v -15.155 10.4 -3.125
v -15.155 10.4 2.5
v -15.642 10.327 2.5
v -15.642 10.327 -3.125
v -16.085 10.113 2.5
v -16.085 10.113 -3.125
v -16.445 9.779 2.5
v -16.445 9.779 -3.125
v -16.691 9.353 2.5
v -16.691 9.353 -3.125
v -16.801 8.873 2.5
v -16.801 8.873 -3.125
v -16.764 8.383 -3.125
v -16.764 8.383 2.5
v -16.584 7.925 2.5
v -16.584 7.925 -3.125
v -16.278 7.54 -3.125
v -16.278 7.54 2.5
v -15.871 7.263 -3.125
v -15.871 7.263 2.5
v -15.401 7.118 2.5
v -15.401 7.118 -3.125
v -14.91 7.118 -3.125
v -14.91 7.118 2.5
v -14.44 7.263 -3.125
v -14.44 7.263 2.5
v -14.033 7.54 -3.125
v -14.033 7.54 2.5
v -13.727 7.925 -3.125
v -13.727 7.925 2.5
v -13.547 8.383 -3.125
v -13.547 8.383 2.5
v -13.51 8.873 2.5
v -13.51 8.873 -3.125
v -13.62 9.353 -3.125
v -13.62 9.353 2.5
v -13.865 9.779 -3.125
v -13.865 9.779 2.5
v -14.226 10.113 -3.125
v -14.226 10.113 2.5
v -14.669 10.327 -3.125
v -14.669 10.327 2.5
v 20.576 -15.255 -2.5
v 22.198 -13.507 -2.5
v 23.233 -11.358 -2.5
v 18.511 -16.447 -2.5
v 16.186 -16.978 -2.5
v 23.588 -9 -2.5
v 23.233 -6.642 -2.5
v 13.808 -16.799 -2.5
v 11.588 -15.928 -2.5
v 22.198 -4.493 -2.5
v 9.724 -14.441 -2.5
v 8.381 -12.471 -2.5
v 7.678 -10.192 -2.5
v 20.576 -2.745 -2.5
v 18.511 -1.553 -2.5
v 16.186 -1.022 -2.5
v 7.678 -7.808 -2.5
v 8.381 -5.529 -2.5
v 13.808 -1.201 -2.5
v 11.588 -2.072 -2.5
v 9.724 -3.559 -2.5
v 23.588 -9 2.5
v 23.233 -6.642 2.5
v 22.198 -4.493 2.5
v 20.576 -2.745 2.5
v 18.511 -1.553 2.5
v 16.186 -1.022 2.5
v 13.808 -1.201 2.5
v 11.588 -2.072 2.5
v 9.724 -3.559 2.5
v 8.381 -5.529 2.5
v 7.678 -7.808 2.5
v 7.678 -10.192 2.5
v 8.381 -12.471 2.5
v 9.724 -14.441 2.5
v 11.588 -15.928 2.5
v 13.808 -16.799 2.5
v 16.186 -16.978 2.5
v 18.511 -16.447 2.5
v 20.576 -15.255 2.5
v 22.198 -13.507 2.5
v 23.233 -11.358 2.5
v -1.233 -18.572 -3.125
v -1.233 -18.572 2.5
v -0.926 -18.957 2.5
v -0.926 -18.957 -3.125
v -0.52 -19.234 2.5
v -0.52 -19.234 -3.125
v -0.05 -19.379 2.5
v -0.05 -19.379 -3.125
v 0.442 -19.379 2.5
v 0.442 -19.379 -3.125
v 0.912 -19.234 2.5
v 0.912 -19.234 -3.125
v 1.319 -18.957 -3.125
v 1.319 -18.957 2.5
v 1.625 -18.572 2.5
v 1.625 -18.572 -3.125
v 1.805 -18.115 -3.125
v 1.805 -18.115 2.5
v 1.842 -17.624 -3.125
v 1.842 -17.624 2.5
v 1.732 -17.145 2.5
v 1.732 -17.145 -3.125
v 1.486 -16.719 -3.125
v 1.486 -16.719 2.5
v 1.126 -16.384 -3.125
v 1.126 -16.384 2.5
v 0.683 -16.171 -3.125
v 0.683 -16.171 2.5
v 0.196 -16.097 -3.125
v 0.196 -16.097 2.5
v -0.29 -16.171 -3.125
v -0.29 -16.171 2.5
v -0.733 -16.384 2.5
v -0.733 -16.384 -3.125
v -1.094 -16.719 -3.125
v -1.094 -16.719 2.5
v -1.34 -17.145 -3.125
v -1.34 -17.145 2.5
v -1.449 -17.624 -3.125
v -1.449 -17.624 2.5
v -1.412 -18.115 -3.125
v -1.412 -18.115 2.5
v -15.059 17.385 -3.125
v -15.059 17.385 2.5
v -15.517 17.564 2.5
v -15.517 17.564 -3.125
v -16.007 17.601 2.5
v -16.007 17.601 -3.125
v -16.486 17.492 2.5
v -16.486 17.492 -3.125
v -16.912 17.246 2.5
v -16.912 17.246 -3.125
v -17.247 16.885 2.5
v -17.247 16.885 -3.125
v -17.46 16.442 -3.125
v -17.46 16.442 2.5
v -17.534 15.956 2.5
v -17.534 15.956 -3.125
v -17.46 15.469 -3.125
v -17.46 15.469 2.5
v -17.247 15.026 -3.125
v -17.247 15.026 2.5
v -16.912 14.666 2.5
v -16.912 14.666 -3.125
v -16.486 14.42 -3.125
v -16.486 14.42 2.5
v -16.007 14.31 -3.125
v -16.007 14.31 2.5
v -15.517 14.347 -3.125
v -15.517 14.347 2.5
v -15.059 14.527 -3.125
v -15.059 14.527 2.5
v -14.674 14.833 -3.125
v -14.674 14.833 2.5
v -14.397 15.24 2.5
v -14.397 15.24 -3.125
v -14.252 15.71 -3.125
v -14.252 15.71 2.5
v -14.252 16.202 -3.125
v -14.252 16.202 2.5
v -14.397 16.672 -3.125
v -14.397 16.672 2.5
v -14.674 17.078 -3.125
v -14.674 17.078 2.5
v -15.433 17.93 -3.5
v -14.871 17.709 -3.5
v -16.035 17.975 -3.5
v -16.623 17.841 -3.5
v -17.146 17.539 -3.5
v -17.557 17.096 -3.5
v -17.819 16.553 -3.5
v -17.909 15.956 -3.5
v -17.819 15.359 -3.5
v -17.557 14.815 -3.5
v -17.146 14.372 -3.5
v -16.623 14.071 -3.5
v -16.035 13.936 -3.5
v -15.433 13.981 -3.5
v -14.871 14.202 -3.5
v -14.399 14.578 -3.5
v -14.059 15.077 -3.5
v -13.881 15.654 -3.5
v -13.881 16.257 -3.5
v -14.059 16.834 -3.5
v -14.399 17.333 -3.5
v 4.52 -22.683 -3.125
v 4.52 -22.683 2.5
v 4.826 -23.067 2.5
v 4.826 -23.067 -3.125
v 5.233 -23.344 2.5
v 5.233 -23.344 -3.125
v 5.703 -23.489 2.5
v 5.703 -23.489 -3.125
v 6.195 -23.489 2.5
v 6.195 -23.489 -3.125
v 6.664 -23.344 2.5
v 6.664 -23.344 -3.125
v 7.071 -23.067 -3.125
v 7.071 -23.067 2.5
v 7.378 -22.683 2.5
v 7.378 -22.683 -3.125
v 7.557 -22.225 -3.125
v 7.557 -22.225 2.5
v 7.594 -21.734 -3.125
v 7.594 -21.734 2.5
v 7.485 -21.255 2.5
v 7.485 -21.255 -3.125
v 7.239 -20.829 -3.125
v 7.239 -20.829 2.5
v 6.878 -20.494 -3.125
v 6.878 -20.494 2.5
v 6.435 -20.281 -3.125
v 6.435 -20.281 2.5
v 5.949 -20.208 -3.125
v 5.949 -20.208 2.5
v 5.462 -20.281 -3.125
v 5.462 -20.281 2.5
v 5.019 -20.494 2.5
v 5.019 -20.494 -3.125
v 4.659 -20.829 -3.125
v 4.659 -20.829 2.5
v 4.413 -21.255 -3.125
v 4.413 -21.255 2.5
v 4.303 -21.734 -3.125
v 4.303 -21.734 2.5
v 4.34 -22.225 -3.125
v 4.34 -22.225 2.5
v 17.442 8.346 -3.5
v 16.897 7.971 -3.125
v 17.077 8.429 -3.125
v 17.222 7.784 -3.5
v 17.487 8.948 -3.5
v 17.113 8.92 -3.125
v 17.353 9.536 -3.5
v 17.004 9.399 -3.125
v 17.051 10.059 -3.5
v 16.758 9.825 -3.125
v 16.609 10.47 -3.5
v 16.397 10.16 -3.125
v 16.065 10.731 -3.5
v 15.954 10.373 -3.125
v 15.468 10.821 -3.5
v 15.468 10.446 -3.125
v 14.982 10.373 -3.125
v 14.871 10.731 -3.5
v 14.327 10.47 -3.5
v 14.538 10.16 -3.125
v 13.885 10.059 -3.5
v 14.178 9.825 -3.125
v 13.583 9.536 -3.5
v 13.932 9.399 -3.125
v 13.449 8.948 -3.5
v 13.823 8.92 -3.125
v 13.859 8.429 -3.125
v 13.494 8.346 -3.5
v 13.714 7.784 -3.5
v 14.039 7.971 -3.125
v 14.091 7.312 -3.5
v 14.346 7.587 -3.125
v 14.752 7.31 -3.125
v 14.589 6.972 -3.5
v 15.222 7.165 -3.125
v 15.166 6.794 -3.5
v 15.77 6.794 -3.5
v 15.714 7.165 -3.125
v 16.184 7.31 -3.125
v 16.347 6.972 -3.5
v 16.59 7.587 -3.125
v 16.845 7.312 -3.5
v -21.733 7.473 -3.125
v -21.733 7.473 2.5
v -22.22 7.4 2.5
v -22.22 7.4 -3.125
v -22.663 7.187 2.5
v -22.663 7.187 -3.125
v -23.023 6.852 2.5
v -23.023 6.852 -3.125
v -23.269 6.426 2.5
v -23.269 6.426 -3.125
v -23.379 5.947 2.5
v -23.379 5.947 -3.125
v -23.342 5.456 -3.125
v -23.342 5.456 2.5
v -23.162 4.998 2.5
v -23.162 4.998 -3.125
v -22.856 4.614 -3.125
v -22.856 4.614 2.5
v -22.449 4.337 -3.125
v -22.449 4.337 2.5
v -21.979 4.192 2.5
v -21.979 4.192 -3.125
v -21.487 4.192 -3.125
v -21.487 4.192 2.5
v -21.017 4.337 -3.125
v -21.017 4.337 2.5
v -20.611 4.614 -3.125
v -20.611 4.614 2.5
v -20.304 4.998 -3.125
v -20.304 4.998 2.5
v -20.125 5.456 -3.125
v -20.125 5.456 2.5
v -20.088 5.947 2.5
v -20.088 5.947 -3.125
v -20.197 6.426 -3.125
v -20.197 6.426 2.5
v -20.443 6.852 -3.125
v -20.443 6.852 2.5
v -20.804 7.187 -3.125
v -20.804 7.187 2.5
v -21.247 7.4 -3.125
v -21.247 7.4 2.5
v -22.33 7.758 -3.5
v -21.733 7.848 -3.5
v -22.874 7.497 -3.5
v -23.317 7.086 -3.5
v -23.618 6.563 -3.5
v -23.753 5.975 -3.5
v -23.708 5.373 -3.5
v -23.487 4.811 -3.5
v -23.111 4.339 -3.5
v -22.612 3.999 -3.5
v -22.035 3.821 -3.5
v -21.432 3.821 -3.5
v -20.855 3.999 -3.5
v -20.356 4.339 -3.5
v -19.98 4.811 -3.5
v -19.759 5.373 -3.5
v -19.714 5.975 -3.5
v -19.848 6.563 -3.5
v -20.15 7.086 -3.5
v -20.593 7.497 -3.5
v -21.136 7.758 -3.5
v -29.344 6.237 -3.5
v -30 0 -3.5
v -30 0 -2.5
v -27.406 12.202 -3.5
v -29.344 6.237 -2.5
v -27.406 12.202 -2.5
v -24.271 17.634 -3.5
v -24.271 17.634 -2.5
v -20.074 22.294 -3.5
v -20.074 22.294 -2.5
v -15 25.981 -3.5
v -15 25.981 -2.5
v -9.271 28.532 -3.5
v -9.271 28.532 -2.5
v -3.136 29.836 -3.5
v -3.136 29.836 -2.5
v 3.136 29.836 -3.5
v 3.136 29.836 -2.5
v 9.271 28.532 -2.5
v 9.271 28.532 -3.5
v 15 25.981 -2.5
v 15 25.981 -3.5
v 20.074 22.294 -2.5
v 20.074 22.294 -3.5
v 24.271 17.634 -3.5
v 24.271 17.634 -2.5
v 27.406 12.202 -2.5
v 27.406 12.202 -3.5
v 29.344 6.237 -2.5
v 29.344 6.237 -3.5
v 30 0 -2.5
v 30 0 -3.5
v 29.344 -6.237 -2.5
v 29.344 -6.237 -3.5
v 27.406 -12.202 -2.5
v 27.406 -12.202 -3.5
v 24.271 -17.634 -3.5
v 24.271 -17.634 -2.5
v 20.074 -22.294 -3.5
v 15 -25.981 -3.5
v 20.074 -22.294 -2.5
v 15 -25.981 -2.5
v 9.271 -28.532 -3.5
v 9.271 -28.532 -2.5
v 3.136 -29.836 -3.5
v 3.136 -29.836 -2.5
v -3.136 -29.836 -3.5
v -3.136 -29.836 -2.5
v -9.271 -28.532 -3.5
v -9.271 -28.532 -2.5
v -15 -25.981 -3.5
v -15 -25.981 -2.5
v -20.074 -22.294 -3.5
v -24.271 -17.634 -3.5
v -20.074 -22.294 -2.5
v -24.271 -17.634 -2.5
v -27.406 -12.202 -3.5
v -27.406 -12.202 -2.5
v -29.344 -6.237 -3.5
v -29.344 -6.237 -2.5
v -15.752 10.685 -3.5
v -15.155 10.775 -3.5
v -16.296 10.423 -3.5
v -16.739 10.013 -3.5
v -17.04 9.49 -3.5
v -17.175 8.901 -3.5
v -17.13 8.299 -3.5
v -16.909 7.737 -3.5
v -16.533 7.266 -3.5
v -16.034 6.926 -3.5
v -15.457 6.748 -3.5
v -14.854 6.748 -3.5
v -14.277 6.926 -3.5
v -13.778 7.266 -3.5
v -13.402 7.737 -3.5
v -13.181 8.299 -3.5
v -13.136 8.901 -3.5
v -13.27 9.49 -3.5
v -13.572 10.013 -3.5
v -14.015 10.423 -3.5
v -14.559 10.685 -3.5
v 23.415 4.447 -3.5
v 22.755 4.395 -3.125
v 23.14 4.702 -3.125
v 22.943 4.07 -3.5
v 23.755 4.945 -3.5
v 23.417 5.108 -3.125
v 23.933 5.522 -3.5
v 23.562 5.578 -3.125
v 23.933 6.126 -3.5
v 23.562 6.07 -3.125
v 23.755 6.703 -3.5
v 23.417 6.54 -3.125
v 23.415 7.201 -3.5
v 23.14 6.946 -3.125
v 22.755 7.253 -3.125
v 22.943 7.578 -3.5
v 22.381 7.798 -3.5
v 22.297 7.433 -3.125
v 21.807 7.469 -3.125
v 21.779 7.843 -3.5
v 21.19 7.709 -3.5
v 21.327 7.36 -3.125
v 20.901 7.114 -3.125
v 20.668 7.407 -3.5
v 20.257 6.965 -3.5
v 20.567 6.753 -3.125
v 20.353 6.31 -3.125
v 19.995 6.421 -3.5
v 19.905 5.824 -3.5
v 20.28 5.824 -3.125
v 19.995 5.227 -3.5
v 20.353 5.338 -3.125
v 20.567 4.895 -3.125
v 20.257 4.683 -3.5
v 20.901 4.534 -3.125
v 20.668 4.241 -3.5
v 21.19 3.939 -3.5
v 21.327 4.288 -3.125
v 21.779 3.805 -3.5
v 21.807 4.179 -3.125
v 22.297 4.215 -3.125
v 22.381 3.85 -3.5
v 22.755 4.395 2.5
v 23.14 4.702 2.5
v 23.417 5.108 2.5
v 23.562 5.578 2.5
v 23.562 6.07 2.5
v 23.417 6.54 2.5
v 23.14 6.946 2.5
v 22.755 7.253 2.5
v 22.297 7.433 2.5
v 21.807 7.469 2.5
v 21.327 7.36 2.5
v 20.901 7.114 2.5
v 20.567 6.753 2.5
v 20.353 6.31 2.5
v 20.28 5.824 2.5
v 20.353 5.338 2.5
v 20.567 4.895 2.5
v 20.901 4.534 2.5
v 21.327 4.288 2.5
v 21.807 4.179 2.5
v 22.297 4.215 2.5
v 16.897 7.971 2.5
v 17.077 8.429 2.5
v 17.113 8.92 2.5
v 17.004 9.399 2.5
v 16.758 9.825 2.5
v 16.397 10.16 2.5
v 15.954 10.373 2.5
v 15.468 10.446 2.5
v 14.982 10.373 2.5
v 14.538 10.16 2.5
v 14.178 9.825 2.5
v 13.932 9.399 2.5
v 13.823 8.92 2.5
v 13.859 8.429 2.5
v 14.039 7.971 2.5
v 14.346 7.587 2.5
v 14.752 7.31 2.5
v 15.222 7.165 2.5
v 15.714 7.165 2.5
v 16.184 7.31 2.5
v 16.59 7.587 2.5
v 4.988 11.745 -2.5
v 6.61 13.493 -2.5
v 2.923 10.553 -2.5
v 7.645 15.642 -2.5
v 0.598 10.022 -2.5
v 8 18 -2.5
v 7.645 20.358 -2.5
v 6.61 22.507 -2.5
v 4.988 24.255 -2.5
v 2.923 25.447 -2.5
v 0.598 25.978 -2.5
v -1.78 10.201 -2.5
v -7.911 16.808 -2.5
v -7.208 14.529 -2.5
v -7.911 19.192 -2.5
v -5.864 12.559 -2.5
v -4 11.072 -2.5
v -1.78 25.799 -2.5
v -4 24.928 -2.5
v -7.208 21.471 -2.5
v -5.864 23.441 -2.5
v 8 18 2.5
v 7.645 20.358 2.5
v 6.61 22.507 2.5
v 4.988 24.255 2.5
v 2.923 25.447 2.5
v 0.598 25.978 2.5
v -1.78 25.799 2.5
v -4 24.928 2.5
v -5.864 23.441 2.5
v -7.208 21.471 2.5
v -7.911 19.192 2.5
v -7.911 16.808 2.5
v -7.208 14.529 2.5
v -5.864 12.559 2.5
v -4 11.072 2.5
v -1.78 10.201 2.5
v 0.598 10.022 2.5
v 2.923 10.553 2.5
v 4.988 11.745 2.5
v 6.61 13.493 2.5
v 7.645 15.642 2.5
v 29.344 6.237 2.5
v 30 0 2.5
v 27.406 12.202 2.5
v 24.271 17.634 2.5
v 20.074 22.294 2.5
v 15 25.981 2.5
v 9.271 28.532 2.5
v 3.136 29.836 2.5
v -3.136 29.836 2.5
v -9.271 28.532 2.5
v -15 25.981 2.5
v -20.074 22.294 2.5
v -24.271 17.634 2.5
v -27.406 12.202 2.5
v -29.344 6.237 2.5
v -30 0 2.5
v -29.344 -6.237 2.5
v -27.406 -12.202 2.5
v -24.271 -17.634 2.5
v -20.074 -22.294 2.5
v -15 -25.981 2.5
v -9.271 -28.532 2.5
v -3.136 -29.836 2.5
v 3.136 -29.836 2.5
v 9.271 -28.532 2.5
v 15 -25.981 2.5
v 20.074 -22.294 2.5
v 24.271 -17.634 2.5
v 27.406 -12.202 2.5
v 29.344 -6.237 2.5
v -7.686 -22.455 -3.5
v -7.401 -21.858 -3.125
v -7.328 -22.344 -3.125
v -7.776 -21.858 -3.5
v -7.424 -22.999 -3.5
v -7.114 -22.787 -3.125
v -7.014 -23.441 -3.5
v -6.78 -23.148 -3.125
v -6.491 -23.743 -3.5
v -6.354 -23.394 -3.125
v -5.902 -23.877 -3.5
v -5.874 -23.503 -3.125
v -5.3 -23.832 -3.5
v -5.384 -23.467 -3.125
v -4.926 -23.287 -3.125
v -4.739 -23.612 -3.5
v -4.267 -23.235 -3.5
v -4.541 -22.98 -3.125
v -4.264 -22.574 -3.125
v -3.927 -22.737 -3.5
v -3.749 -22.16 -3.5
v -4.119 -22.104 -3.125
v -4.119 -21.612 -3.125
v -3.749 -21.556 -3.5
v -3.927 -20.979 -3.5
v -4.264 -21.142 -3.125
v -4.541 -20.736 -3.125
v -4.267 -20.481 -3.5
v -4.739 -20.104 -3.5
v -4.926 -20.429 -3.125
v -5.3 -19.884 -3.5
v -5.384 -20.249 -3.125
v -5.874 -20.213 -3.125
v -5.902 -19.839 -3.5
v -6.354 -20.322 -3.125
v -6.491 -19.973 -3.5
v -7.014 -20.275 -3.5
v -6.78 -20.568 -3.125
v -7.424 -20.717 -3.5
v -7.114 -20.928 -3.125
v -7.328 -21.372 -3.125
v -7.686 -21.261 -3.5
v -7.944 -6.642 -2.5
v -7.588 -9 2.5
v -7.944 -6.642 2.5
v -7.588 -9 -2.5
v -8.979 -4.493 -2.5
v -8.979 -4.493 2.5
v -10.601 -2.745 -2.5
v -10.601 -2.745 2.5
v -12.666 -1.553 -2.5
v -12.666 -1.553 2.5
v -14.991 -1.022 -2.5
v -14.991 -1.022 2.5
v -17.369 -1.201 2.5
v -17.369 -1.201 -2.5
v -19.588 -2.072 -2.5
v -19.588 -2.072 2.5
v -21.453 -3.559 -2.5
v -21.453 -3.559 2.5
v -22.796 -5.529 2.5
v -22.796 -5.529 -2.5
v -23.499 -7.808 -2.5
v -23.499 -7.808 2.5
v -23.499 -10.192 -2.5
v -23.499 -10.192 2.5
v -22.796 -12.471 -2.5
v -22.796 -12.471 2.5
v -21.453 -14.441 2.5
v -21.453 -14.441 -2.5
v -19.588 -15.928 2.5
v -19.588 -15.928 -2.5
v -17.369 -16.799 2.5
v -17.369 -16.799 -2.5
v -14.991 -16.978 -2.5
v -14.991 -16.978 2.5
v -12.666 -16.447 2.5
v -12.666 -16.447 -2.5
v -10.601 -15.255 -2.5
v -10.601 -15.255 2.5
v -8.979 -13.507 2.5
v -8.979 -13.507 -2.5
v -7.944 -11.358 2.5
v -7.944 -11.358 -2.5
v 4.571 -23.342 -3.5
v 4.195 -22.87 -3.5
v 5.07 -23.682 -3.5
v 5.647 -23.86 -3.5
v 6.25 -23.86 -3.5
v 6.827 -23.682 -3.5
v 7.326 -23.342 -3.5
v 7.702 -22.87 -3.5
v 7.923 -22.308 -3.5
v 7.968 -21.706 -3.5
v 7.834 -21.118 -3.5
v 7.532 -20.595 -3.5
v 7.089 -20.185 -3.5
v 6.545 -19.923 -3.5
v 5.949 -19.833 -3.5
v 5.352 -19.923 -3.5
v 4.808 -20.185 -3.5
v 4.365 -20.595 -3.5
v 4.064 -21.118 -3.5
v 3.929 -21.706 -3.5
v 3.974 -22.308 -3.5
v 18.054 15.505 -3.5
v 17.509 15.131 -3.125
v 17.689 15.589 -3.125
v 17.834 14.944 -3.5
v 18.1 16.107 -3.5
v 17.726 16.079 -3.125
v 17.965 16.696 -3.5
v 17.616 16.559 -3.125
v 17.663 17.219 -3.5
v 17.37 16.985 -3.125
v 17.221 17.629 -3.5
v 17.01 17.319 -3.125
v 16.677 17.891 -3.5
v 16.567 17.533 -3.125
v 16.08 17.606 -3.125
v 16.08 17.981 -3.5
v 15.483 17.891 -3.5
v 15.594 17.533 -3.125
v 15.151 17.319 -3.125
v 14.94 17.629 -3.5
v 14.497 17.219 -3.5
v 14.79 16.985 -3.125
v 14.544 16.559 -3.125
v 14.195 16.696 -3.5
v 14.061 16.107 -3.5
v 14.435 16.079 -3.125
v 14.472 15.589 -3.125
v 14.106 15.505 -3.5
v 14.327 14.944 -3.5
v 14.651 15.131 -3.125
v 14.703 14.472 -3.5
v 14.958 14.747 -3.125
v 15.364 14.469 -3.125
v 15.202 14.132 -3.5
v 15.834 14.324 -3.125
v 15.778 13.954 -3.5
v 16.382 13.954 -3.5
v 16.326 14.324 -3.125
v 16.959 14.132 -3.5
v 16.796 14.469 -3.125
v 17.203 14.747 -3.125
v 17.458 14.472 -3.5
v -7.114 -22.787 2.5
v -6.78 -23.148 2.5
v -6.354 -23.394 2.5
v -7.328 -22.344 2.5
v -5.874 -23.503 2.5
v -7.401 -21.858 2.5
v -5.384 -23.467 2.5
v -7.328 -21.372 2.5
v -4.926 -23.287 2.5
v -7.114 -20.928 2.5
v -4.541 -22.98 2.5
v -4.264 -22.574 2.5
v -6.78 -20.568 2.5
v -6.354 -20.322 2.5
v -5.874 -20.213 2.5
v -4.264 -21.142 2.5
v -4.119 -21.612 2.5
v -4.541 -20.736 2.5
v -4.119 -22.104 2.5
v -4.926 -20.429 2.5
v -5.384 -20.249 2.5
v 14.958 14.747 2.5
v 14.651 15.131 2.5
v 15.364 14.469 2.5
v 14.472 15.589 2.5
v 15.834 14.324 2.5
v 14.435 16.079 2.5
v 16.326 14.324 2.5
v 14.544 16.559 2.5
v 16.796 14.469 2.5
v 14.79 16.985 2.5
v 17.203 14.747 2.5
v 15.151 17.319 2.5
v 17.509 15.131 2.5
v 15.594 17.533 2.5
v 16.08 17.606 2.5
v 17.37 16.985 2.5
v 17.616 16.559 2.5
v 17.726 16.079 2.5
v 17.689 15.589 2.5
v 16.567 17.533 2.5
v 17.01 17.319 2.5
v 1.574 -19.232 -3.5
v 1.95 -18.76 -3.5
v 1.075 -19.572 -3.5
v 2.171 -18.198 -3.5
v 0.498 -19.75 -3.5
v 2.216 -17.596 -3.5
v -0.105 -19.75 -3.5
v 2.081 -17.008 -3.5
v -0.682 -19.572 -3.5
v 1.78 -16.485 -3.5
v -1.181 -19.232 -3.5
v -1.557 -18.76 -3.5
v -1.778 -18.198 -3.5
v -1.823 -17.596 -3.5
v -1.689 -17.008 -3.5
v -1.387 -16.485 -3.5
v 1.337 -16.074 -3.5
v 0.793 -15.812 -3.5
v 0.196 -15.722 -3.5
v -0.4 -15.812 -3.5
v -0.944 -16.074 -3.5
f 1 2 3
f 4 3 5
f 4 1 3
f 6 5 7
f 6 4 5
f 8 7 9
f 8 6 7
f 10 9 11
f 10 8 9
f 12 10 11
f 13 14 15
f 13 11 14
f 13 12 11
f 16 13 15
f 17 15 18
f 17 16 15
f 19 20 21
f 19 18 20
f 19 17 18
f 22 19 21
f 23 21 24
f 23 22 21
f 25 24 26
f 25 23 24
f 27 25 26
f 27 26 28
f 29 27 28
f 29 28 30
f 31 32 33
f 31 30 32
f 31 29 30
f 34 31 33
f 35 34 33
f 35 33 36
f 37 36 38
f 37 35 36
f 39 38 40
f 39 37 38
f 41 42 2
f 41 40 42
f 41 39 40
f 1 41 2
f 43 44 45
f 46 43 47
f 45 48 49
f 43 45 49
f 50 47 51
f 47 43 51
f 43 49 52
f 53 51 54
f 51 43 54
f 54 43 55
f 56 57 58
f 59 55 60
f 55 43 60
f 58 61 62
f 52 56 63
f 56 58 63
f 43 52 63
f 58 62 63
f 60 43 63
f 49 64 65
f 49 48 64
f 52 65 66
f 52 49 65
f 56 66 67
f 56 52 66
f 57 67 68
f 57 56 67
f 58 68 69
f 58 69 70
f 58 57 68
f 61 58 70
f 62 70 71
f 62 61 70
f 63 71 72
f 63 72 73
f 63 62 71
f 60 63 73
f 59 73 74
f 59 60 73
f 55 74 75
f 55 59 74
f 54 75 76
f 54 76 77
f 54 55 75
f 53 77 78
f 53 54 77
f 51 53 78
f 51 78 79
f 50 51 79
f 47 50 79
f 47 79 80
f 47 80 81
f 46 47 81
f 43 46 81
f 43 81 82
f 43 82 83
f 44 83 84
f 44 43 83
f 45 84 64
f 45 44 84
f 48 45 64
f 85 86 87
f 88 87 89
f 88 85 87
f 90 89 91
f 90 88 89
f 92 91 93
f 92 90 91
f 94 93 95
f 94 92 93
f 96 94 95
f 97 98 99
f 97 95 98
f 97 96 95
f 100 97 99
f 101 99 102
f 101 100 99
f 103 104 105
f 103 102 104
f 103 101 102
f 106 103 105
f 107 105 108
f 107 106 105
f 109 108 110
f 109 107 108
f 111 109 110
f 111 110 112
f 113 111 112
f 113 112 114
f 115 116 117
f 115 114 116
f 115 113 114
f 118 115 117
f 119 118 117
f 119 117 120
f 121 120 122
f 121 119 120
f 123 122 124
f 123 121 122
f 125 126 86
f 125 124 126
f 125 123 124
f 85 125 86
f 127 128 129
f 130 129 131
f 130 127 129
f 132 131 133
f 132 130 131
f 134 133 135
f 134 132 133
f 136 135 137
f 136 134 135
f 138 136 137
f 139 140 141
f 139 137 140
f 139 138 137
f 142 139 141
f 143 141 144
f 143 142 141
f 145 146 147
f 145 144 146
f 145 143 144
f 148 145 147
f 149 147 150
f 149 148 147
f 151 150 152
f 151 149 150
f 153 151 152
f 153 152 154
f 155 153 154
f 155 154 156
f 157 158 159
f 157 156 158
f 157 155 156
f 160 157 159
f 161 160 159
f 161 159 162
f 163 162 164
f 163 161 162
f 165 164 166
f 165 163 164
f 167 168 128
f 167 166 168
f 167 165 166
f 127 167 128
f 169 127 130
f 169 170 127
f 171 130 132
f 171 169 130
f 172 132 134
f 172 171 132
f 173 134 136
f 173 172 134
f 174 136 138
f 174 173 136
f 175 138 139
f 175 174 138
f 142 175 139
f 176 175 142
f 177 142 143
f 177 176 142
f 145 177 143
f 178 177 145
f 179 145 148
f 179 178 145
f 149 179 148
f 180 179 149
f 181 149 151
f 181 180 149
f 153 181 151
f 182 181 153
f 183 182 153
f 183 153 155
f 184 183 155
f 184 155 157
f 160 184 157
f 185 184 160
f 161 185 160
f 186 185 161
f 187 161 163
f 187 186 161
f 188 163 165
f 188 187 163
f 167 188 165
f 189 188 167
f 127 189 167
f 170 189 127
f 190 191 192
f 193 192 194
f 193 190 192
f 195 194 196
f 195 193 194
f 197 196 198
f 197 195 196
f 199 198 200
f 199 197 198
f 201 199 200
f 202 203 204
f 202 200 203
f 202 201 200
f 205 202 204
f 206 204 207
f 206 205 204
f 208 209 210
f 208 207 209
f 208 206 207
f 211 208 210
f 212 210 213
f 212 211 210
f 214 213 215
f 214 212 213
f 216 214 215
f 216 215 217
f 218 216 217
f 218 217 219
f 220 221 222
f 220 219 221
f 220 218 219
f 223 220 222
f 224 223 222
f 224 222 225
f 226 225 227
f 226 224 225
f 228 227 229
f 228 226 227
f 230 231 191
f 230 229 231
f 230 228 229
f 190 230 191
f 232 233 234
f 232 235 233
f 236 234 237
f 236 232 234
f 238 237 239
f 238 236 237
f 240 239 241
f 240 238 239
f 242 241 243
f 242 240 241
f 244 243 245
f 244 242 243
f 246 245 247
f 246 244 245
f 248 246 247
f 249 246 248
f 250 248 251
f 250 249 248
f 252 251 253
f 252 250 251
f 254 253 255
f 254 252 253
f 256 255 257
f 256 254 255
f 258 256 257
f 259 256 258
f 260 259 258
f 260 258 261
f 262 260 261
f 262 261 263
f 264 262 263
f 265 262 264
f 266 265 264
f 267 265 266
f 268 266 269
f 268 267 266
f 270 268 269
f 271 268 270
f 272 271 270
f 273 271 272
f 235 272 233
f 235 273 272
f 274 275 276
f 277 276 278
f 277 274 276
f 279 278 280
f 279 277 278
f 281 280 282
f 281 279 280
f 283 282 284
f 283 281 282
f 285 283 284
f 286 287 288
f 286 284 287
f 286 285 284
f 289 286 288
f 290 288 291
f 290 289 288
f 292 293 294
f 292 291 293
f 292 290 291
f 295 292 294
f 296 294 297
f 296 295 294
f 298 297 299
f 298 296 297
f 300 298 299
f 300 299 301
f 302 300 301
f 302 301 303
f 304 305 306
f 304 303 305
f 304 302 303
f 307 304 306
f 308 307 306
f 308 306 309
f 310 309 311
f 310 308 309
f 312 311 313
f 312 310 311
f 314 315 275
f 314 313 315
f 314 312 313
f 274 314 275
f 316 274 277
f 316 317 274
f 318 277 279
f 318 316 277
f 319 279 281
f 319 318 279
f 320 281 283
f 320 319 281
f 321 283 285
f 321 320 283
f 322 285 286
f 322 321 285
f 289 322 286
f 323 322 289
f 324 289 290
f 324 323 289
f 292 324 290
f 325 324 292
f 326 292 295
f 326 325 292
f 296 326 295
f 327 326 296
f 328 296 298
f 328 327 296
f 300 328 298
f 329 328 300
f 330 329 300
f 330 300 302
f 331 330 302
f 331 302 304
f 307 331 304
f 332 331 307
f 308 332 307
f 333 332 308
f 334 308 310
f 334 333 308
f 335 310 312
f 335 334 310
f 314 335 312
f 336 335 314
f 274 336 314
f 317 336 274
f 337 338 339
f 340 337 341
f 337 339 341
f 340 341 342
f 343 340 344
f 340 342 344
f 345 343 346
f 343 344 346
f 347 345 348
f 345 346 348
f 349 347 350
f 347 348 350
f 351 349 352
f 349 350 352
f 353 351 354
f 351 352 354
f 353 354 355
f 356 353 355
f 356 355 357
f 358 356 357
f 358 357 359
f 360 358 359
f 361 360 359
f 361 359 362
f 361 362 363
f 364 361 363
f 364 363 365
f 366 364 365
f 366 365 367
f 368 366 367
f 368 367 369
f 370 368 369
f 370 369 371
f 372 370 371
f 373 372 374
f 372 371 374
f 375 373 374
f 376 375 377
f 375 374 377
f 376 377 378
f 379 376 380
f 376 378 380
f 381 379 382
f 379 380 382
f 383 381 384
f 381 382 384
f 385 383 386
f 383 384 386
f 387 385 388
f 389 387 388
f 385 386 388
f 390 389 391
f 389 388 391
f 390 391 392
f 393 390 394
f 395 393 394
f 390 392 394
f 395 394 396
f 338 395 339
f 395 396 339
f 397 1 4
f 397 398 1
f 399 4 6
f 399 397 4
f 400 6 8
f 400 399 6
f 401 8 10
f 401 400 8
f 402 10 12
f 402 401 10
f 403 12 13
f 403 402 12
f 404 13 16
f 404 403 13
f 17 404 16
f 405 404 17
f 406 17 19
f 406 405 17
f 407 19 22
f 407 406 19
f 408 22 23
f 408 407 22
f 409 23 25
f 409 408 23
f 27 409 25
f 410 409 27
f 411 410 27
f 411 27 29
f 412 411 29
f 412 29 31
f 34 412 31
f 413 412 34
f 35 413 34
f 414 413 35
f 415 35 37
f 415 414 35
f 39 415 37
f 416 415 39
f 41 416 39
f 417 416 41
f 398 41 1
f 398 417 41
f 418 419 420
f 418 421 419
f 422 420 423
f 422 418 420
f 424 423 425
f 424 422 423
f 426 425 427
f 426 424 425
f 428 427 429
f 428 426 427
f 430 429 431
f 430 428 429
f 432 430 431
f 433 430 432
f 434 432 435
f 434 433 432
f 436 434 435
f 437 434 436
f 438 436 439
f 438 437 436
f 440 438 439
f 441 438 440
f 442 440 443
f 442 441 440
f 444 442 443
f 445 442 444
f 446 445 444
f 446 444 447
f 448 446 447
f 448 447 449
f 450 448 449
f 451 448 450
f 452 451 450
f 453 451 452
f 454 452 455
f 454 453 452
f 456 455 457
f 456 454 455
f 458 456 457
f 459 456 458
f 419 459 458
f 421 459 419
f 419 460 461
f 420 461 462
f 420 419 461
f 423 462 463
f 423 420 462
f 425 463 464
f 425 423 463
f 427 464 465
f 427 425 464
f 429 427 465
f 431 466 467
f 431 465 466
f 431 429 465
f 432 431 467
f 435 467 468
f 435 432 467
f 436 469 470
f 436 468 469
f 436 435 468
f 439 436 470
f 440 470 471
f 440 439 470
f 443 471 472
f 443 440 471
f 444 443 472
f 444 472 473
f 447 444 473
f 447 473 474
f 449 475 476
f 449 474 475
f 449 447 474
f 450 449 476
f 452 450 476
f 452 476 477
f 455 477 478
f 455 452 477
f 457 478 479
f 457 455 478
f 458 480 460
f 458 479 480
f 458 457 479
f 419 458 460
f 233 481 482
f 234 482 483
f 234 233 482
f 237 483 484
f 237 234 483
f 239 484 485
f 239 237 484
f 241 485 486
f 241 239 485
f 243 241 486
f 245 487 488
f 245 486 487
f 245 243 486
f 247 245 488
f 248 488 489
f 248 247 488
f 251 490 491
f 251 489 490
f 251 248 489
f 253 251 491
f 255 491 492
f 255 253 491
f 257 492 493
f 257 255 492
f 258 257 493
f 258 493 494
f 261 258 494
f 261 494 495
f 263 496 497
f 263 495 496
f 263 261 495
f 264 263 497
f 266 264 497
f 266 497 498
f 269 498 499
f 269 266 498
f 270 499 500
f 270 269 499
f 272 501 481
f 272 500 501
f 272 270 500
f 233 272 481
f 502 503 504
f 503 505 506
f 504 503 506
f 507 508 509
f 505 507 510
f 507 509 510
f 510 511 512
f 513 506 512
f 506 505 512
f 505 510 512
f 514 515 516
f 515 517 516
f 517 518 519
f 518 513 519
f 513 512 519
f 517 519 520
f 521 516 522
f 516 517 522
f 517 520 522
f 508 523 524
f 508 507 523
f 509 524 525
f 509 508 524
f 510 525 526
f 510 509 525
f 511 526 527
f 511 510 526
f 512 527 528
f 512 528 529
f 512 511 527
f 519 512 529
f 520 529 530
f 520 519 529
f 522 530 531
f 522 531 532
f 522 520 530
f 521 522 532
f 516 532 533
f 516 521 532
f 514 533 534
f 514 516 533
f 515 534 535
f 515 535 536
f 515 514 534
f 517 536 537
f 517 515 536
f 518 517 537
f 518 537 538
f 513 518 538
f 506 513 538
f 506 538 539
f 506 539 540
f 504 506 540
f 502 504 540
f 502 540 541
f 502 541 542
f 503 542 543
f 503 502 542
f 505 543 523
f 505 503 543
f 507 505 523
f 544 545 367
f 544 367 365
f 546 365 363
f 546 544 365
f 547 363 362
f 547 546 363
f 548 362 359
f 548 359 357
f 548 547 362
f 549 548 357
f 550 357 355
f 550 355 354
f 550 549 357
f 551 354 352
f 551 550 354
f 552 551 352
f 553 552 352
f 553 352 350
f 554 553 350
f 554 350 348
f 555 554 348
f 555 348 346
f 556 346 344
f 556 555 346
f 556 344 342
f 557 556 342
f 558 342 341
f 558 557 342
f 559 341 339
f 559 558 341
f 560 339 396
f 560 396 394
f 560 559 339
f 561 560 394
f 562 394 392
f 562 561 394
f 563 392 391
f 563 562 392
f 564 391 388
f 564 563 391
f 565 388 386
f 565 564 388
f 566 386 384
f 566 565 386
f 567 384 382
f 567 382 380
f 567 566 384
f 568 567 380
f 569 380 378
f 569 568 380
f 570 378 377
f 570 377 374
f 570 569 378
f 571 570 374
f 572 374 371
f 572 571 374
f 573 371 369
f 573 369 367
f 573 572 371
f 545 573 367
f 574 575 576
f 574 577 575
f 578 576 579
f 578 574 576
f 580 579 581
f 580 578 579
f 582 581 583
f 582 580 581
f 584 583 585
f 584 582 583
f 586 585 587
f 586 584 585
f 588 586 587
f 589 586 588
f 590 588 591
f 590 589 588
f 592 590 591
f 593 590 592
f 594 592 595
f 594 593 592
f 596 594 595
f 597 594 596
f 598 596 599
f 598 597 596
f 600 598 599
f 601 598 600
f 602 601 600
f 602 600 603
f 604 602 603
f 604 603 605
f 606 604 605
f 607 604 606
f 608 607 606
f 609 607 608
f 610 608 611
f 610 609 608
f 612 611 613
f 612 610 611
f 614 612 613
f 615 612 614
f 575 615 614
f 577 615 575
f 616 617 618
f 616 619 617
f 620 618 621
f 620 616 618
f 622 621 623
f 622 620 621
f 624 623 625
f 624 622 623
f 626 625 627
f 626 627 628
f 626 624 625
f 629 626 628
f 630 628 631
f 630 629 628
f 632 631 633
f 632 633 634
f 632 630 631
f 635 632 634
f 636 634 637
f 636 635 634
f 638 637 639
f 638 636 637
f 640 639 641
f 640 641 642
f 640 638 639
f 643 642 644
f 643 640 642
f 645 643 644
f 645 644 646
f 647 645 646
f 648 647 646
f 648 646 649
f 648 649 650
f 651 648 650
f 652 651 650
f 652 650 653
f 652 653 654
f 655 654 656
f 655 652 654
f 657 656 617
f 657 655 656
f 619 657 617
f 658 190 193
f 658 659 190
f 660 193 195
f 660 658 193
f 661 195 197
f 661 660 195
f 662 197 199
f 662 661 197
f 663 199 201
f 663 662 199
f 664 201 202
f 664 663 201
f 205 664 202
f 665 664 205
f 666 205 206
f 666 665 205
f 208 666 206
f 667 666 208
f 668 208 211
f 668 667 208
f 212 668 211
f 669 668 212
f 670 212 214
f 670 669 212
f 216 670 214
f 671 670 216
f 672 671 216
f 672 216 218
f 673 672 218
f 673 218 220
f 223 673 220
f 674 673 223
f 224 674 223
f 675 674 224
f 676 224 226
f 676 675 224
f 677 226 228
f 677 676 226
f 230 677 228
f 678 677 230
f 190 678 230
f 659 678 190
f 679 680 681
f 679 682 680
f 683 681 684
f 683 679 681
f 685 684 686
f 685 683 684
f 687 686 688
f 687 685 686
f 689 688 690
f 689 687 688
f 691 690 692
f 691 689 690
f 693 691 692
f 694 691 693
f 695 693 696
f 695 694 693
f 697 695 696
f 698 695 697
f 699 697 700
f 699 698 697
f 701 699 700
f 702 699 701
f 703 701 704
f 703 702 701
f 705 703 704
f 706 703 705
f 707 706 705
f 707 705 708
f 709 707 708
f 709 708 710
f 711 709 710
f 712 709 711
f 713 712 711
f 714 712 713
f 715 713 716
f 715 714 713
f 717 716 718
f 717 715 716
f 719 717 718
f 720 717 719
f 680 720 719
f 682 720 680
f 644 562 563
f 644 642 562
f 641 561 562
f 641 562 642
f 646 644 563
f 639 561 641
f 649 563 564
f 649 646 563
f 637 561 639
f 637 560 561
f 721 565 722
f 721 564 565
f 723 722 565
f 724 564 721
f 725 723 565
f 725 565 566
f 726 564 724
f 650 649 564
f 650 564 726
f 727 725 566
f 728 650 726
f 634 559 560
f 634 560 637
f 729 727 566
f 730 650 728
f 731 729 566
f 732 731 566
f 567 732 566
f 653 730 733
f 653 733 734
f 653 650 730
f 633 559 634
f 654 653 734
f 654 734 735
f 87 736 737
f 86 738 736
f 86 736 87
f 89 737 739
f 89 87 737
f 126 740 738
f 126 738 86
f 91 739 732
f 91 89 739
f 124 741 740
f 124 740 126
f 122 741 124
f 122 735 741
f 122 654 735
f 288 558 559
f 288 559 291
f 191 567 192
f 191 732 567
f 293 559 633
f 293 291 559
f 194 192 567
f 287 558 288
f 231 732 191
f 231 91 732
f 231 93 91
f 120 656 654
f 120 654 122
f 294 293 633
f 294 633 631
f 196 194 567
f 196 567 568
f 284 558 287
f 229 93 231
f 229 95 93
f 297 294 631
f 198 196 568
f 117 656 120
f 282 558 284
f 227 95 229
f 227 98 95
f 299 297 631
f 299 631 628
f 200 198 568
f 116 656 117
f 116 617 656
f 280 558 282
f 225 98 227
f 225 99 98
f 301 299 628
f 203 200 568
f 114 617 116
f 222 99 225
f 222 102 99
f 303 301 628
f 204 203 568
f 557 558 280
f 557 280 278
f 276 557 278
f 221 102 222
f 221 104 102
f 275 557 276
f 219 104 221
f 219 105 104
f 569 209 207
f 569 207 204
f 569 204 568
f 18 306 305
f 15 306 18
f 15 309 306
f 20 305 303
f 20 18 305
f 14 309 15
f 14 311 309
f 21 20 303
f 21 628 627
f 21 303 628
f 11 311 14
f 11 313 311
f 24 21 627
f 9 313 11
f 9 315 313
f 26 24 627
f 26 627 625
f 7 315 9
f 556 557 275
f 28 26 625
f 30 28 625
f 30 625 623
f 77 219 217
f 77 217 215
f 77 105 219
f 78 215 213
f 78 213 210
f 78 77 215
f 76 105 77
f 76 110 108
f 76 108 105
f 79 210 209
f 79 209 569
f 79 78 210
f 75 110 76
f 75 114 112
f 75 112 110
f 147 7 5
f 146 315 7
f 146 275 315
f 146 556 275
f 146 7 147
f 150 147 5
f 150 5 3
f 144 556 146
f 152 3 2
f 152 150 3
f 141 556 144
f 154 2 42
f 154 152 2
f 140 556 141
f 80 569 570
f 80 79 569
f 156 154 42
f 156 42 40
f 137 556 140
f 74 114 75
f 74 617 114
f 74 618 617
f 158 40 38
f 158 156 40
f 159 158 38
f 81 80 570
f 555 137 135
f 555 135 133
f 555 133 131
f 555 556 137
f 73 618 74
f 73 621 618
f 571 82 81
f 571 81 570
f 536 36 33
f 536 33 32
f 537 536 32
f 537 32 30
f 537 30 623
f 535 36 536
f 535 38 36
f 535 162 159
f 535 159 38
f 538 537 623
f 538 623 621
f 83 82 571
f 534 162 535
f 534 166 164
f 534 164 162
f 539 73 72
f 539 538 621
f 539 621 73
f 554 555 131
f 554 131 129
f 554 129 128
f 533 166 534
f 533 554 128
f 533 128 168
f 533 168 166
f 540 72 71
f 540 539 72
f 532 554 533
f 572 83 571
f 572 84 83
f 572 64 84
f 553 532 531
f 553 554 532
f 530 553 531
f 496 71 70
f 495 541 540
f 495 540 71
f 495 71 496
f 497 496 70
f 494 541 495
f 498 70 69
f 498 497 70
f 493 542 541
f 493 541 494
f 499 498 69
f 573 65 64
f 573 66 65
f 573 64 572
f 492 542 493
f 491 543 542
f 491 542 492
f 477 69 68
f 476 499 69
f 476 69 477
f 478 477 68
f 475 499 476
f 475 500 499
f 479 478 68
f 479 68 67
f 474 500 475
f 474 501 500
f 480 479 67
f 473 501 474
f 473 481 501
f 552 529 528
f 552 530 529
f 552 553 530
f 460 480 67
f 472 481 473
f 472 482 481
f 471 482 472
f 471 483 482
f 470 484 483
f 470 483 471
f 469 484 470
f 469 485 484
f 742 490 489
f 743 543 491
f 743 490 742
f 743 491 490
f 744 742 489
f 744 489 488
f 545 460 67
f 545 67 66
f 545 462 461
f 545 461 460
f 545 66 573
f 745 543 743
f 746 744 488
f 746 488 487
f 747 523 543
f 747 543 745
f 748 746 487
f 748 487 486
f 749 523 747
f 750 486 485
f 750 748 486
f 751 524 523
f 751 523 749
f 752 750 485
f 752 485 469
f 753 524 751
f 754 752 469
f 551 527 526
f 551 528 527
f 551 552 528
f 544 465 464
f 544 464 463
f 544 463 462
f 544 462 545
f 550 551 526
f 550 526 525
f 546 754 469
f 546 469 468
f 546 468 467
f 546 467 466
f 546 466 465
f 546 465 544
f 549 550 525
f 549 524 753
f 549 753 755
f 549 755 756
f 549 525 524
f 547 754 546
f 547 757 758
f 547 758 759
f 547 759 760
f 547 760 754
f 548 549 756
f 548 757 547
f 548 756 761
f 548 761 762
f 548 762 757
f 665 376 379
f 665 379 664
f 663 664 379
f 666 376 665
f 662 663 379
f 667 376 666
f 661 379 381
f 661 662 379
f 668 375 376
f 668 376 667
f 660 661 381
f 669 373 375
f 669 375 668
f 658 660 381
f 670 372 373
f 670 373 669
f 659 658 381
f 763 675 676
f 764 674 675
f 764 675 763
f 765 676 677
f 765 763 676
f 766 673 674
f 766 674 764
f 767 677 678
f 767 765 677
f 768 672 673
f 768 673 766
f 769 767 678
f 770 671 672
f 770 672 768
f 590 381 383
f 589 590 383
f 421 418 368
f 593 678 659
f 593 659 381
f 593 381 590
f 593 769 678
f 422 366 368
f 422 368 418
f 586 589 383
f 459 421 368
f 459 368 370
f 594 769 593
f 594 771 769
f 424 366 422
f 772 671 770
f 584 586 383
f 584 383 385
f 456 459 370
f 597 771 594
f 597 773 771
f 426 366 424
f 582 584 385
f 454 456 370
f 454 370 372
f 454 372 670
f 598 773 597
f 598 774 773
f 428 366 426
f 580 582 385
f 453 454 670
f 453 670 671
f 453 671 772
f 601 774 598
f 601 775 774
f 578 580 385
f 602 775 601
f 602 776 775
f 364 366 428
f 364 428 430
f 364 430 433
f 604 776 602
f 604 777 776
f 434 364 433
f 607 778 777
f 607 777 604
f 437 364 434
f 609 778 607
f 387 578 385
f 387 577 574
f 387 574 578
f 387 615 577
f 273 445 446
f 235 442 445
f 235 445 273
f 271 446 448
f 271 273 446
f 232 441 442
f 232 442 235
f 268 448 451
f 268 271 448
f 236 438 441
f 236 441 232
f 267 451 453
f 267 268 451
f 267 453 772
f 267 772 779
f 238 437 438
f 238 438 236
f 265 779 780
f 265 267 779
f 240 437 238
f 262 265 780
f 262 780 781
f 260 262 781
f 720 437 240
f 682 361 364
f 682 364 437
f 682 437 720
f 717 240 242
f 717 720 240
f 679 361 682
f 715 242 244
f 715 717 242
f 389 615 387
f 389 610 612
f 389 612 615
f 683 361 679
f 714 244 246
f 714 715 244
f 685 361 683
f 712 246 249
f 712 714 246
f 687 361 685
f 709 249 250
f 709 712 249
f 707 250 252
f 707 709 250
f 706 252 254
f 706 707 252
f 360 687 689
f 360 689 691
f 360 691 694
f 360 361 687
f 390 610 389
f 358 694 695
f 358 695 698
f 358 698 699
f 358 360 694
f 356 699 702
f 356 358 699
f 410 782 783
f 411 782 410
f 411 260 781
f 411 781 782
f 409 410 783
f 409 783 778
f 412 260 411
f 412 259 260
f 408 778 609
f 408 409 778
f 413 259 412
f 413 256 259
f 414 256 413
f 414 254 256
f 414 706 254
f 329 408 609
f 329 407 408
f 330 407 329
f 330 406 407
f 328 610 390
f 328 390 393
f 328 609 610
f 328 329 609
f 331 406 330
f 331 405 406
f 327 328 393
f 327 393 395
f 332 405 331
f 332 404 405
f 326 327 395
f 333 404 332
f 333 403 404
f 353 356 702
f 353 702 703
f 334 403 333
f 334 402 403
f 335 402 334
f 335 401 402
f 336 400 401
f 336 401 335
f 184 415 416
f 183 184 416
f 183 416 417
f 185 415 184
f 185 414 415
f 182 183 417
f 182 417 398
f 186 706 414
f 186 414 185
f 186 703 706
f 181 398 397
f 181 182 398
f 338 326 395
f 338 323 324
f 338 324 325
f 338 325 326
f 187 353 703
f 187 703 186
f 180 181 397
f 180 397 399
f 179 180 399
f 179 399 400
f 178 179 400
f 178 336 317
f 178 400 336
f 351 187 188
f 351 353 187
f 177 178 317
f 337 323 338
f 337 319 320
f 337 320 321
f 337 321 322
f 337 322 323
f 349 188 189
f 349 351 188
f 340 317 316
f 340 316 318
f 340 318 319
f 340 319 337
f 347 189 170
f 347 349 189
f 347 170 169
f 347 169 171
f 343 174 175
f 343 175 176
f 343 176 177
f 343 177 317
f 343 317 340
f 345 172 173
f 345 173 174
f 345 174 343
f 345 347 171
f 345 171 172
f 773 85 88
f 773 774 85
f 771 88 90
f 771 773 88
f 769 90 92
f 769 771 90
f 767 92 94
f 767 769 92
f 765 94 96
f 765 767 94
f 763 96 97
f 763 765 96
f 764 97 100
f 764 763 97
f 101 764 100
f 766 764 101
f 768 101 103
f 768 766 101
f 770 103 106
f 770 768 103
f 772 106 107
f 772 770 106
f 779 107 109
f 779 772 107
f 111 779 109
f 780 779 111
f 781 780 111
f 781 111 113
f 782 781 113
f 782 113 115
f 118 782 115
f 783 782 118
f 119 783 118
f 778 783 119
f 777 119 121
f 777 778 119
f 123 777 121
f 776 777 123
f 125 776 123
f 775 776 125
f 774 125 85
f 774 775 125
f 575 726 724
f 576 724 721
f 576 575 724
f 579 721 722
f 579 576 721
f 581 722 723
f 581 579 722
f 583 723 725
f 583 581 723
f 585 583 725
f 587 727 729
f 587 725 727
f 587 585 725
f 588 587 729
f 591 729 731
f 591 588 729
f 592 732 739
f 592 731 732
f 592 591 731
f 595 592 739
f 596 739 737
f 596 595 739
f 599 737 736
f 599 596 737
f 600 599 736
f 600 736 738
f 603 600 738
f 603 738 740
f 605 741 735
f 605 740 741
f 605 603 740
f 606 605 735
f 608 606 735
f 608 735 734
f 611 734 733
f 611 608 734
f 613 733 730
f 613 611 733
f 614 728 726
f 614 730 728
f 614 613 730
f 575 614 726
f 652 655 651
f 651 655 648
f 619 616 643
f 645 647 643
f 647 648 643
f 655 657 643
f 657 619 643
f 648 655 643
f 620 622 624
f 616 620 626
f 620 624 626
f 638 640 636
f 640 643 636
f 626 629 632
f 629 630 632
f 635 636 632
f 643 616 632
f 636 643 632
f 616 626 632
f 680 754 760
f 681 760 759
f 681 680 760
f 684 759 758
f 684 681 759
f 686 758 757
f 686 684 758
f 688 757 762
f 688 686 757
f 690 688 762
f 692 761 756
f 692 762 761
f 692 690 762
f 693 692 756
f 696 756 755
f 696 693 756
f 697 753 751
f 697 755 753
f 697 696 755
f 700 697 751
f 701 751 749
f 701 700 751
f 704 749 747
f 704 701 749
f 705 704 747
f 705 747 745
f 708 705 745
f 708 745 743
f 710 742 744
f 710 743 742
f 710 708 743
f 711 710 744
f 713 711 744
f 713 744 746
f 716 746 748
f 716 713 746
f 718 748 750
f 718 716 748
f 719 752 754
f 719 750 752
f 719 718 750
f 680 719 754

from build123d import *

# Parameters (mm, degrees)
SKETCH1_R           = 30
SKETCH1_R_2         = 8
BOSS_EXTRUDE1_DEPTH = 2.5
SKETCH3_R           = 30
BOSS_EXTRUDE2_DEPTH = 1
CIRPATTERN1_COUNT   = 3
CIRPATTERN2_COUNT   = 12


with BuildPart() as part:
    # Sketch1 → Boss-Extrude1 (new, symmetric)
    with BuildSketch(Plane.XY):
        Circle(SKETCH1_R)
        with Locations((0, 18)):
            Circle(SKETCH1_R_2, mode=Mode.SUBTRACT)
        with Locations((15.588457268, -9)):
            Circle(SKETCH1_R_2, mode=Mode.SUBTRACT)
        with Locations((-15.588457268, -9)):
            Circle(SKETCH1_R_2, mode=Mode.SUBTRACT)
    extrude(amount=BOSS_EXTRUDE1_DEPTH, both=True)

    # Sketch3 → Boss-Extrude2 (add)
    with BuildSketch(Plane(origin=(0, 0, -2.5), x_dir=(-1, 0, 0), z_dir=(0, 0, -1))):
        Circle(SKETCH3_R)
    extrude(amount=BOSS_EXTRUDE2_DEPTH)

    # Sketch6 → M4x0.7 Tapped Hole1 (revolve, cut)
    with BuildSketch(Plane(origin=(-21.733331092, 5.823428515, -3.5), x_dir=(0, 1, 0), z_dir=(1, 0, 0))):
        Polygon((0, 0), (0, 11.091420021), (1.65, 10.1), (1.65, 0.375), (2.025, 0), align=None)
    m4x0_7_tapped_hole1 = revolve(axis=Axis((-21.733331092, 5.823428515, -9.85), (0, 0, 1)), mode=Mode.SUBTRACT)

    # Sketch8 → M4x0.7 Tapped Hole2 (revolve, cut)
    with BuildSketch(Plane(origin=(-15.155444566, 8.75, -3.5), x_dir=(0, 1, 0), z_dir=(1, 0, 0))):
        Polygon((0, 0), (0, 11.091420021), (1.65, 10.1), (1.65, 0.375), (2.025, 0), align=None)
    m4x0_7_tapped_hole2 = revolve(axis=Axis((-15.155444566, 8.75, -9.85), (0, 0, 1)), mode=Mode.SUBTRACT)

    # CirPattern1: M4x0.7 Tapped Hole2 ×3 about axis
    cirpattern1_axis = Axis((0.169620148, -0.06701082, 0), (0, 0, 1))
    for i in range(1, CIRPATTERN1_COUNT):
        add(m4x0_7_tapped_hole2.rotate(cirpattern1_axis, i * 360 / CIRPATTERN1_COUNT), mode=Mode.SUBTRACT)

    # CirPattern2: M4x0.7 Tapped Hole1 ×12 about axis, 6 skipped
    cirpattern2_axis = Axis((0.098499141, -0.026092579, 0), (0, 0, -1))
    add([m4x0_7_tapped_hole1.rotate(cirpattern2_axis, i * 360 / CIRPATTERN2_COUNT) for i in range(1, CIRPATTERN2_COUNT) if i not in (2, 3, 6, 7, 10, 11)], mode=Mode.SUBTRACT)


solid = part.part
